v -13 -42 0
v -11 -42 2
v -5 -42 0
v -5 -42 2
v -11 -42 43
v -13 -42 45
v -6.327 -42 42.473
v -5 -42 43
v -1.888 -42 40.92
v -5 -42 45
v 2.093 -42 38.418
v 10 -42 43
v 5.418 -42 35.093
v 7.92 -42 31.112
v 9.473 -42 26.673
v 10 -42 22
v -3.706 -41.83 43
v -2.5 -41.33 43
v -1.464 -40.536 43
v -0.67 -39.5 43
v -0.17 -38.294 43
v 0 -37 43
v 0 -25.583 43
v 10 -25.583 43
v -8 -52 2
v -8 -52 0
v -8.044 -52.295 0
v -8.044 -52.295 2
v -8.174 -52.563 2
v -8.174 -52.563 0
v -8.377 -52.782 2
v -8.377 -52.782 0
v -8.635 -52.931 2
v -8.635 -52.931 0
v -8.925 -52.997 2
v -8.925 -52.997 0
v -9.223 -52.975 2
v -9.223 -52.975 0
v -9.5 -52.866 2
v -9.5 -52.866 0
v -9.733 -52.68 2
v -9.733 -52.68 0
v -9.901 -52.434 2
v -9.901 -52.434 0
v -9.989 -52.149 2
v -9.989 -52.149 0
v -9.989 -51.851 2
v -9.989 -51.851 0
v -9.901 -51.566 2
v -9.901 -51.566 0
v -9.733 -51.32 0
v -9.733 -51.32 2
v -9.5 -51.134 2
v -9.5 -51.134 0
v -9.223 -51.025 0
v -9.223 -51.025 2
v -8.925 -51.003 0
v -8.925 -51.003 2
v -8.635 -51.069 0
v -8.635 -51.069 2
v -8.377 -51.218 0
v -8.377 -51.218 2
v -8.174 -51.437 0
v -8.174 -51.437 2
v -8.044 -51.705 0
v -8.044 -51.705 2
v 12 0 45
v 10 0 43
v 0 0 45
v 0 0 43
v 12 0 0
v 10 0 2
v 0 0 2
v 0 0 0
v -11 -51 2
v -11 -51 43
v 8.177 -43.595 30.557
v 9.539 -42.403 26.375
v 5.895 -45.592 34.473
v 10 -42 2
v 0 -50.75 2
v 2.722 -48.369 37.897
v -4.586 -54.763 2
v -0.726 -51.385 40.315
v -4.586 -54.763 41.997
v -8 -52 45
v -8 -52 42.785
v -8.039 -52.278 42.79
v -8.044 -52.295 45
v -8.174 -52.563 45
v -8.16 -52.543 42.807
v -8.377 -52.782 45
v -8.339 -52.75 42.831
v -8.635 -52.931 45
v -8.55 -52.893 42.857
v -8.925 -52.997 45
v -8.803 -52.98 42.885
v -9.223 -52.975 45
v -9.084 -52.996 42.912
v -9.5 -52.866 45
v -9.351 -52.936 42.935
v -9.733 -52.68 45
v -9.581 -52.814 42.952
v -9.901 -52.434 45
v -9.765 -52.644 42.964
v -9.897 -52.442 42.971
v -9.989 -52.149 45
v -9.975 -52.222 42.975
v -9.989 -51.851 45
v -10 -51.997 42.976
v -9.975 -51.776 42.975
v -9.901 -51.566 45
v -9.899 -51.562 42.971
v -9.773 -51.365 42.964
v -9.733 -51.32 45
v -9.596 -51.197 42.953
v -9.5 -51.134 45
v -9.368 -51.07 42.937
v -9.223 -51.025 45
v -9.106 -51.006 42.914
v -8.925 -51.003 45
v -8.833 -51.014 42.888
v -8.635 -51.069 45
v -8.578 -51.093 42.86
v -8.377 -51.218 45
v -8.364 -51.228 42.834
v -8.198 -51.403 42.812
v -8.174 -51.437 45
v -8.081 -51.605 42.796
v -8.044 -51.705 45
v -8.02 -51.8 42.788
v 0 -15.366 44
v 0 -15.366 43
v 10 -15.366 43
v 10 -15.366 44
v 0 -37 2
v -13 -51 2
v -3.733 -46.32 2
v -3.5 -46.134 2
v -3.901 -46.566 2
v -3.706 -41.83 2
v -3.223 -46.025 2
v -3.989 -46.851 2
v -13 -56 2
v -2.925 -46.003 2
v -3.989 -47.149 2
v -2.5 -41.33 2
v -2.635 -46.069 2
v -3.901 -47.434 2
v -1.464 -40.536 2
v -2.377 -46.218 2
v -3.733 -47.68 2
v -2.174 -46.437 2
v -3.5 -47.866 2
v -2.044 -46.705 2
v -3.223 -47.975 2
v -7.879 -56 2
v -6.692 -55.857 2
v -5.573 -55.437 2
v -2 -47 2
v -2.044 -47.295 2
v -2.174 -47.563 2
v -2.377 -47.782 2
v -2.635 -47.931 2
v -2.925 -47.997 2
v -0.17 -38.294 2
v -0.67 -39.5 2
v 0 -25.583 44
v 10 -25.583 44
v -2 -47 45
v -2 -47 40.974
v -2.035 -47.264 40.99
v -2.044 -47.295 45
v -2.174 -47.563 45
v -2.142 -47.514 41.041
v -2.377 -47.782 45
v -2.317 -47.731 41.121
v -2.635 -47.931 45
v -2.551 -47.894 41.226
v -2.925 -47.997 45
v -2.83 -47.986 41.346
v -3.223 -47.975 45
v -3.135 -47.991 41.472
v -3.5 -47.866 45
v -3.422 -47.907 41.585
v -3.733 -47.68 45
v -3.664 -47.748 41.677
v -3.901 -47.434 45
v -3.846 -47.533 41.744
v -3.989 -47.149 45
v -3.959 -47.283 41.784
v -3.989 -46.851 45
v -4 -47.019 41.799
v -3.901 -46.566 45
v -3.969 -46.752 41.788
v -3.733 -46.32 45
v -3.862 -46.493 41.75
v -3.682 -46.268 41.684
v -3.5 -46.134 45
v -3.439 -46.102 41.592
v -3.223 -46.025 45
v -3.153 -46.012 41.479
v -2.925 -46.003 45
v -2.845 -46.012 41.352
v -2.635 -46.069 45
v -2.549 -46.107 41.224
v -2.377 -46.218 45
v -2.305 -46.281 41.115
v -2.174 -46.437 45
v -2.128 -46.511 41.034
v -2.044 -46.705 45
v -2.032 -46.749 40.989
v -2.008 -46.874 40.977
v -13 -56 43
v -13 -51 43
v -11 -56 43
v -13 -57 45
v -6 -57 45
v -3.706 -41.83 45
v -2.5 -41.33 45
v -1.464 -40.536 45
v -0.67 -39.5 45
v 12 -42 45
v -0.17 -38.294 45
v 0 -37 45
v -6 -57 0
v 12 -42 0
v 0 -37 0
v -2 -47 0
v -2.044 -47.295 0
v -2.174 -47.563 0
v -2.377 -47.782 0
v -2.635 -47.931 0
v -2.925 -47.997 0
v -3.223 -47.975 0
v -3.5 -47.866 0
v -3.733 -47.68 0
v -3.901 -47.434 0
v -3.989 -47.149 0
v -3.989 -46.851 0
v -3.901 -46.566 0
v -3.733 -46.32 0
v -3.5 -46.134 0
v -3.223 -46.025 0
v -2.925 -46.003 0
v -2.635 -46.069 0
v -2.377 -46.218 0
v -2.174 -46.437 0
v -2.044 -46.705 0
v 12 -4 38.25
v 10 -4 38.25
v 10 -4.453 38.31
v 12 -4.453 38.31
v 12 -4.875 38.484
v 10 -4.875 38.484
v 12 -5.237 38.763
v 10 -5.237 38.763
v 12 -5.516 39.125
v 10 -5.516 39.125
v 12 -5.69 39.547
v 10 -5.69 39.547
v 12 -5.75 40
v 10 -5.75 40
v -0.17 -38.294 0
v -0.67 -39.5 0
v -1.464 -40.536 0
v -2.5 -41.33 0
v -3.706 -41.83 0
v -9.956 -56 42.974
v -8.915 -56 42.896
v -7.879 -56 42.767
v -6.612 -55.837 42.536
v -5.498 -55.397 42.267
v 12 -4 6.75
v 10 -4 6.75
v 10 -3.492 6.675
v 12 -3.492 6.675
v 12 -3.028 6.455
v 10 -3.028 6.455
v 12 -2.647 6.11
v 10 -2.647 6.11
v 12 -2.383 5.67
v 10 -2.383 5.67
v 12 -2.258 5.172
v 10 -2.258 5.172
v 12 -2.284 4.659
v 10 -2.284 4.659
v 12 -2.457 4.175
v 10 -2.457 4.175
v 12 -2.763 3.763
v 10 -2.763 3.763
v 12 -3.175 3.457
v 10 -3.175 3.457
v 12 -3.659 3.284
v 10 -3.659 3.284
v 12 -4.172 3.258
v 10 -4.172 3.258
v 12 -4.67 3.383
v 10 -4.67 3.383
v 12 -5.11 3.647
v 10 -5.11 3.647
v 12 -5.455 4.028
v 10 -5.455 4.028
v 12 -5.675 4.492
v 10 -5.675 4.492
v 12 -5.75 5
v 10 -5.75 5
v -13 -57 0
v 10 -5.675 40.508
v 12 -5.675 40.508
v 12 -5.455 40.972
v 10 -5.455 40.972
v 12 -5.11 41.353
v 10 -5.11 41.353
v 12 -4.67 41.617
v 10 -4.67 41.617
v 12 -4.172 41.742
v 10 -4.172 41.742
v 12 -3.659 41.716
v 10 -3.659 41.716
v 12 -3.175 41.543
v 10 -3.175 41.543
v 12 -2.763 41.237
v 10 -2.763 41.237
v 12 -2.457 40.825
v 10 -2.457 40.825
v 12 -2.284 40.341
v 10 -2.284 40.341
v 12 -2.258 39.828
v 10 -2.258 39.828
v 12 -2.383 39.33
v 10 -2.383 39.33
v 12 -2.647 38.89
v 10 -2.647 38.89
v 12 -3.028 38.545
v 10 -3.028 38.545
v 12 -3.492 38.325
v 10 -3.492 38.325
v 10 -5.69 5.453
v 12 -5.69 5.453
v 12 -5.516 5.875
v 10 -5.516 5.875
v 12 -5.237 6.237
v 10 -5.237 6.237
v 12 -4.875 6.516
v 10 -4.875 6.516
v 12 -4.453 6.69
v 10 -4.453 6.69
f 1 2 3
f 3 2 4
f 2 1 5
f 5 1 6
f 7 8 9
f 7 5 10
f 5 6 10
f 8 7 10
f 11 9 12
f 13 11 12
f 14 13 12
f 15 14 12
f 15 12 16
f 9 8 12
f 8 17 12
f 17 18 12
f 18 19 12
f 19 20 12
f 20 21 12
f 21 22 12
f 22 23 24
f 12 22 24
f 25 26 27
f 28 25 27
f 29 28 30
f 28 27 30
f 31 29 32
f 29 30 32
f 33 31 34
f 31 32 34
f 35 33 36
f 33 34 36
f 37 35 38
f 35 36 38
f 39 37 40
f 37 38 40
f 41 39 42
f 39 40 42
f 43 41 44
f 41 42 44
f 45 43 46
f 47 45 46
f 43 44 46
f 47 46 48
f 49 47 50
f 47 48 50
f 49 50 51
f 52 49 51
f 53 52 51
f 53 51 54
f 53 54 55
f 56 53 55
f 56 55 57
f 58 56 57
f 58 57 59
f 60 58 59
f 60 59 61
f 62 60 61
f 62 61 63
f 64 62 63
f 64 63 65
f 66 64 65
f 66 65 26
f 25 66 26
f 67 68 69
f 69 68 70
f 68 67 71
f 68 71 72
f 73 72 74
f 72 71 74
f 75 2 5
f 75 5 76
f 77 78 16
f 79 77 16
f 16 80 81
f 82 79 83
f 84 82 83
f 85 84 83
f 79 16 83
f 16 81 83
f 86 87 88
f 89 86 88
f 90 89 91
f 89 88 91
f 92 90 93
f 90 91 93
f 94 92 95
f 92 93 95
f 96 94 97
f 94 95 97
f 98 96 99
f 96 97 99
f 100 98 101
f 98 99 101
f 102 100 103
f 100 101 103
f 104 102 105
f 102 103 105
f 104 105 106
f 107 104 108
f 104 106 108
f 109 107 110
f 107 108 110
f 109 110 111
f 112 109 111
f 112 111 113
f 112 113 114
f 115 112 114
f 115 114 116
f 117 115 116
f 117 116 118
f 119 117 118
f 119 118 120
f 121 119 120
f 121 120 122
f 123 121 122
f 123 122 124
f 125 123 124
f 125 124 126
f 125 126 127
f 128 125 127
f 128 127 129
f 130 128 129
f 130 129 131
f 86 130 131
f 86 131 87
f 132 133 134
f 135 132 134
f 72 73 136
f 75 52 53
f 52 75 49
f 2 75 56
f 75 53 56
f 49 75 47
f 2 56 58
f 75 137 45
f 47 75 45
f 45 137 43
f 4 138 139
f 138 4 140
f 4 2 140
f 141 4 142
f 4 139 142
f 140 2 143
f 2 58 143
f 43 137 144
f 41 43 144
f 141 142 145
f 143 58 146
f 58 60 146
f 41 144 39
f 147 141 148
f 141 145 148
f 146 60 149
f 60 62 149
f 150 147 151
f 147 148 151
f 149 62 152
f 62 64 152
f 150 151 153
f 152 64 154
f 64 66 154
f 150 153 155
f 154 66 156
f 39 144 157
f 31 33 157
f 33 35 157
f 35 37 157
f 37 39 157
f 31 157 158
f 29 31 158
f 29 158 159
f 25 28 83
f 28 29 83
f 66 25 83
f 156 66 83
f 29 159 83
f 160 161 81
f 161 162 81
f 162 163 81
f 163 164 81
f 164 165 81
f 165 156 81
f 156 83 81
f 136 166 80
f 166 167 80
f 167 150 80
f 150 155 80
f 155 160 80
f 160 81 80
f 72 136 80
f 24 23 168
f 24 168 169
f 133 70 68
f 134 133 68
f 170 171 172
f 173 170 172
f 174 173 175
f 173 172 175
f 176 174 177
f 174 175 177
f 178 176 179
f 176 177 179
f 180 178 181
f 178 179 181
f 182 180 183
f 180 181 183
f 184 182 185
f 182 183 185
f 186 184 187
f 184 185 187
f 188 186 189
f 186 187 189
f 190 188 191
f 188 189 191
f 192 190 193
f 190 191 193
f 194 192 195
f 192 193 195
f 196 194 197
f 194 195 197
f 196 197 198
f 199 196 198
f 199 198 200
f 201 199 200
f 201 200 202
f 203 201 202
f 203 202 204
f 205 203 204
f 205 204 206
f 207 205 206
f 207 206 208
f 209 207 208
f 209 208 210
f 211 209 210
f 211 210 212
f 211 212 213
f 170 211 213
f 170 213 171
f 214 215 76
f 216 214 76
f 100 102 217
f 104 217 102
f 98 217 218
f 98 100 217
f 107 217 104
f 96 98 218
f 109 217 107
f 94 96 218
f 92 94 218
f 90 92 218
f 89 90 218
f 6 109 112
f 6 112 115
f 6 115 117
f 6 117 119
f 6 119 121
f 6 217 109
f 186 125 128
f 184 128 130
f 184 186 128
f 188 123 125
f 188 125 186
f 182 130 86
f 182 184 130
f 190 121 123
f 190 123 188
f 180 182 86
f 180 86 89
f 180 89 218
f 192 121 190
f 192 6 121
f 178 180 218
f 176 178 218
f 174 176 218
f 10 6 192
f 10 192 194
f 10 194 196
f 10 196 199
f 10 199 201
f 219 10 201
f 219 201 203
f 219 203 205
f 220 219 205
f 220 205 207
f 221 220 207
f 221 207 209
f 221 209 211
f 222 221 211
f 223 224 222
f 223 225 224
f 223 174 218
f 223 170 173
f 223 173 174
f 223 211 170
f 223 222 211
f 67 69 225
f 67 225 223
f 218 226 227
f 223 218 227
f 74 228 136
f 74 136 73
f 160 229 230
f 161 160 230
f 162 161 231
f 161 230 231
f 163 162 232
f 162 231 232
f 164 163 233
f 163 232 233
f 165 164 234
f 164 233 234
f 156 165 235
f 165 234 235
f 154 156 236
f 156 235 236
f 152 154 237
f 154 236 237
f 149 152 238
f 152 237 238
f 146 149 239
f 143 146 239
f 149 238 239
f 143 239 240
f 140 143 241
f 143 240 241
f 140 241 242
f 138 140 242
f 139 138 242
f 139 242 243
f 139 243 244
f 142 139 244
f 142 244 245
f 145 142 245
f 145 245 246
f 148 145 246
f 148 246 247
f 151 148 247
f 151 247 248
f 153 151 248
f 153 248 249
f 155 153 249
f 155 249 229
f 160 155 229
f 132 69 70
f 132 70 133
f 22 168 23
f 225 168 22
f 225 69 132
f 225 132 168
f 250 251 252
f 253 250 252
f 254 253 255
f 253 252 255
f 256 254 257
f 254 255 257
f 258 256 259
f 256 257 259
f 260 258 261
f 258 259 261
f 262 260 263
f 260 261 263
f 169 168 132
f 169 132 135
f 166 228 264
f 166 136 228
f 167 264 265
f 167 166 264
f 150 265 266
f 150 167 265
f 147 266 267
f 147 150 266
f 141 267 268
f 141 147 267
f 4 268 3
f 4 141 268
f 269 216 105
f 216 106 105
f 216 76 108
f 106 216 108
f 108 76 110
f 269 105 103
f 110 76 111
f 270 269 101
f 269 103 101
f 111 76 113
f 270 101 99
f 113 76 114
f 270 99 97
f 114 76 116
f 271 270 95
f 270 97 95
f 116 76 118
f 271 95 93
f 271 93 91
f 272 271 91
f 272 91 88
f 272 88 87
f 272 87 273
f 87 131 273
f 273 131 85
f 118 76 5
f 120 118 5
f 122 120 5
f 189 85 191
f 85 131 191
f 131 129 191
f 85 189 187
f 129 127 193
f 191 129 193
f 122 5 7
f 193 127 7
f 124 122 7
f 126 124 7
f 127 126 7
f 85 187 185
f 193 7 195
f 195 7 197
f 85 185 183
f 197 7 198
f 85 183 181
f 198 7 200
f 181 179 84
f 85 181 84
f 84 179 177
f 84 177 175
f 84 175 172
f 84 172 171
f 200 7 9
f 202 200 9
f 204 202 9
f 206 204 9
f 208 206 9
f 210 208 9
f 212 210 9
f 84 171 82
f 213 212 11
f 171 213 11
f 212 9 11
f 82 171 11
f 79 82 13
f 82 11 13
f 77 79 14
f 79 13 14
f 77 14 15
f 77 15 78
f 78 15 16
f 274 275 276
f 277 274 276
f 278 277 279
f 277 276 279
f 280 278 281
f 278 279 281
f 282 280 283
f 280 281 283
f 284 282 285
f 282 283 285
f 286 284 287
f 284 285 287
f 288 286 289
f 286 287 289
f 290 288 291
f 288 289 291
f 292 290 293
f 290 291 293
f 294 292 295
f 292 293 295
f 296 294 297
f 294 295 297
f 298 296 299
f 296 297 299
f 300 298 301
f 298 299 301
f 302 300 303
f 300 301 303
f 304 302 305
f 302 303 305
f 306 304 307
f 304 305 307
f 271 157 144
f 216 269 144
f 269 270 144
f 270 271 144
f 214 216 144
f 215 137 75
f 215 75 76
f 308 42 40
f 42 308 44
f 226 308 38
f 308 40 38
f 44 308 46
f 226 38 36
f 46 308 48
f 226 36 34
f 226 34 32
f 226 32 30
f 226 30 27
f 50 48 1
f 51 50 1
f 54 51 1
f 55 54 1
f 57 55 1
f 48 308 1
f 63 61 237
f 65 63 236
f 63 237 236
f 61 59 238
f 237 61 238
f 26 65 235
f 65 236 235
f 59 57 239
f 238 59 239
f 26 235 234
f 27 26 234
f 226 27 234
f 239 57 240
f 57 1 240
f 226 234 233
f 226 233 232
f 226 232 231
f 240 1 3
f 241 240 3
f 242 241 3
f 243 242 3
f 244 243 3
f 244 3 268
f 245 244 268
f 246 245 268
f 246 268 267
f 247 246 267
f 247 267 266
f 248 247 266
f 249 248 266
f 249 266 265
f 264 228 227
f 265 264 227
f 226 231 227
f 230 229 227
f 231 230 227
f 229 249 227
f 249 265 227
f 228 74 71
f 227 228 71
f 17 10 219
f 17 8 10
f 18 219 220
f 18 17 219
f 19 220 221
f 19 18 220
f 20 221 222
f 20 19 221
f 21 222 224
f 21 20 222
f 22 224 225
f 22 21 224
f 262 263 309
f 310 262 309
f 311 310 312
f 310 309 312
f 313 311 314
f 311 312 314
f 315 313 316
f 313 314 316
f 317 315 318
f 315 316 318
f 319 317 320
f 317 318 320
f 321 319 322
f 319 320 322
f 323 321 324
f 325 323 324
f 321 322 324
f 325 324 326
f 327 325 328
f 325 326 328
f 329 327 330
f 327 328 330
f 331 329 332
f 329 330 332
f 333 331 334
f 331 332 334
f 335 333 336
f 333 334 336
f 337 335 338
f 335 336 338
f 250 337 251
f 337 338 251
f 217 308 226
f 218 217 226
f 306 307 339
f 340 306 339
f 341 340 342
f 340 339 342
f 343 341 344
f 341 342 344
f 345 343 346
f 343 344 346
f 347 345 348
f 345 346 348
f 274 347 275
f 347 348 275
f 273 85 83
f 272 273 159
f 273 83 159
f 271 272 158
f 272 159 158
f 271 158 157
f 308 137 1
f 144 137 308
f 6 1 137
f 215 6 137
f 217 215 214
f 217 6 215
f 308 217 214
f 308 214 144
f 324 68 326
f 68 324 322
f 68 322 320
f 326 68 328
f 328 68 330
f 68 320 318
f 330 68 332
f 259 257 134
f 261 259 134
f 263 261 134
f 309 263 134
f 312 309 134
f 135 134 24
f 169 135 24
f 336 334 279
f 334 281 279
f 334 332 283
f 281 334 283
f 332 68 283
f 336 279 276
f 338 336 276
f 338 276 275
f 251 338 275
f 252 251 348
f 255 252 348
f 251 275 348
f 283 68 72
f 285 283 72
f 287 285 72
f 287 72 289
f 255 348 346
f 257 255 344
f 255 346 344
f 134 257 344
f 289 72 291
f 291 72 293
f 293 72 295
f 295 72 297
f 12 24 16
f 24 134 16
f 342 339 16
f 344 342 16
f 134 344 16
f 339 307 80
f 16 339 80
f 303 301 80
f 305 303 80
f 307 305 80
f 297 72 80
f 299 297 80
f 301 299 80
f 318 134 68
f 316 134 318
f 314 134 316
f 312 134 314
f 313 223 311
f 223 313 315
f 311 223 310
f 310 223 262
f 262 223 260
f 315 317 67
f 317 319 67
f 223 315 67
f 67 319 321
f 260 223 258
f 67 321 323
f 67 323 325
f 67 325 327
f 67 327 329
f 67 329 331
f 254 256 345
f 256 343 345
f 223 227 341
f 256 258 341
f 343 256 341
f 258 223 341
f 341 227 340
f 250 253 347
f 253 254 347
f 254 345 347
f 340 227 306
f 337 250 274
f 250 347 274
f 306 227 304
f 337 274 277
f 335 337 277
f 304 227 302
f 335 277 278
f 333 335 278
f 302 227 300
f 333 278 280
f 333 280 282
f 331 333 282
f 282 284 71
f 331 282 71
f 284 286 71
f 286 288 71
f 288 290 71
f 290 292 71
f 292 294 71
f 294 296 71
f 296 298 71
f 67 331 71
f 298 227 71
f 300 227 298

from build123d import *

# Parameters (mm, degrees)
F1_DEPTH  = 45
F3_DEPTH  = 2
F4_W      = 10
F4_H      = 42
F4_R      = 1
F5_DEPTH  = 2
F7_DEPTH  = 2
F8_R      = 5
F9_W      = 10
F9_H      = 10.2169760242
F10_DEPTH = 1
F11_W     = 9
F11_H     = 41
F12_DEPTH = 2
F16_DEPTH = 45.001


# Not quite as in the source:
# - a feature names something its author has since deleted; it is built from what else it names


with BuildPart() as f1:
    # F0 (on Top) → F1 (new body)
    with BuildSketch(Plane.XY):
        with BuildLine():
            Line((12, -42), (12, 0))
            Line((12, 0), (10, 0))
            Line((10, 0), (10, -42))
            Line((10, -42), (-4.5861525412, -54.7628834735))
            ThreePointArc((-4.5861525412, -54.7628834735), (-6.1200422145, -55.6805137201), (-7.8786755805, -56))
            Line((-7.8786755805, -56), (-13, -56))
            Line((-13, -56), (-13, -57))
            Line((-13, -57), (-6, -57))
            Line((-6, -57), (12, -42))
        make_face()
    extrude(amount=F1_DEPTH)

    # F2 (on face) → F3 (cut, through all)
    with BuildSketch(Plane(origin=(10, 0, 0), x_dir=(0, -1, 0), z_dir=(-1, 0, 0))):
        with BuildLine():
            ThreePointArc((4, 6.75), (2.7625631329, 3.7625631329), (5.75, 5))
            ThreePointArc((5.75, 5), (5.2374368671, 6.2374368671), (4, 6.75))
        make_face()
        with BuildLine():
            ThreePointArc((5.75, 40), (2.7625631329, 41.2374368671), (4, 38.25))
            ThreePointArc((4, 38.25), (5.2374368671, 38.7625631329), (5.75, 40))
        make_face()
    extrude(amount=-F3_DEPTH, mode=Mode.SUBTRACT)

    # F4 (on face) → F5 (join)
    with BuildSketch(Plane(origin=(0, 0, 0), x_dir=(1, 0, 0), z_dir=(0, 0, -1))):
        Polygon((10, 42), (12, 42), (0, 52), (0, 50.75), align=None)
        with Locations((5, 21)):
            Rectangle(F4_W, F4_H)
        Polygon((0, 42), (10, 42), (0, 50.75), align=None)
        with BuildLine():
            Line((0, 42), (0, 50.75))
            Line((0, 50.75), (-4.5861525412, 54.7628834735))
            ThreePointArc((-4.5861525412, 54.7628834735), (-6.1200422145, 55.6805137201), (-7.8786755805, 56))
            Line((-7.8786755805, 56), (-13, 56))
            Line((-13, 56), (-13, 42))
            Line((-13, 42), (0, 42))
        make_face()
        with Locations((-9, 52)):
            Circle(F4_R, mode=Mode.SUBTRACT)
        with Locations((-3, 47)):
            Circle(F4_R, mode=Mode.SUBTRACT)
        with Locations((-9, 52)):
            Circle(F4_R)
        with Locations((-3, 47)):
            Circle(F4_R)
    extrude(amount=-F5_DEPTH)

    # F6 (on face) → F7 (join)
    with BuildSketch(Plane.XY.offset(45)):
        Polygon((12, -42), (12, 0), (0, 0), (0, -42), (-13, -42), (-13, -57), (-6, -57), align=None)
    extrude(amount=-F7_DEPTH)

    # F8
    f8_edges = [f1.edges().sort_by_distance(p)[0] for p in [
        (0, -42, 44),
        (0, -42, 1),
    ]]
    fillet(f8_edges, radius=F8_R)

    # F9 (on face) → F10 (cut)
    with BuildSketch(Plane(origin=(0, 0, 43), x_dir=(1, 0, 0), z_dir=(0, 0, -1))):
        with Locations((5, 20.4747493975)):
            Rectangle(F9_W, F9_H)
    extrude(amount=-F10_DEPTH, mode=Mode.SUBTRACT)

    # F11 (on face) → F12 (join)
    with BuildSketch(Plane(origin=(-13, 0, 0), x_dir=(0, -1, 0), z_dir=(-1, 0, 0))):
        with Locations((46.5, 22.5)):
            Rectangle(F11_W, F11_H)
    extrude(amount=-F12_DEPTH)

    # F14 (on offset) → F15 (join, up to the next surface of F1)
    with BuildSketch(Plane.XZ.offset(42)):
        with BuildLine():
            ThreePointArc((-11, 43), (3.8492424049, 36.8492424049), (10, 22))
            Line((10, 22), (10, 43))
            Line((10, 43), (-11, 43))
        make_face()
    extrude(until=Until.NEXT)

    # F4 (on face) → F16 (cut, through all)
    with BuildSketch(Plane(origin=(0, 0, 0), x_dir=(1, 0, 0), z_dir=(0, 0, -1))):
        with Locations((-3, 47)):
            Circle(F4_R)
        with Locations((-9, 52)):
            Circle(F4_R)
    extrude(amount=-F16_DEPTH, mode=Mode.SUBTRACT)


solid = f1.part
